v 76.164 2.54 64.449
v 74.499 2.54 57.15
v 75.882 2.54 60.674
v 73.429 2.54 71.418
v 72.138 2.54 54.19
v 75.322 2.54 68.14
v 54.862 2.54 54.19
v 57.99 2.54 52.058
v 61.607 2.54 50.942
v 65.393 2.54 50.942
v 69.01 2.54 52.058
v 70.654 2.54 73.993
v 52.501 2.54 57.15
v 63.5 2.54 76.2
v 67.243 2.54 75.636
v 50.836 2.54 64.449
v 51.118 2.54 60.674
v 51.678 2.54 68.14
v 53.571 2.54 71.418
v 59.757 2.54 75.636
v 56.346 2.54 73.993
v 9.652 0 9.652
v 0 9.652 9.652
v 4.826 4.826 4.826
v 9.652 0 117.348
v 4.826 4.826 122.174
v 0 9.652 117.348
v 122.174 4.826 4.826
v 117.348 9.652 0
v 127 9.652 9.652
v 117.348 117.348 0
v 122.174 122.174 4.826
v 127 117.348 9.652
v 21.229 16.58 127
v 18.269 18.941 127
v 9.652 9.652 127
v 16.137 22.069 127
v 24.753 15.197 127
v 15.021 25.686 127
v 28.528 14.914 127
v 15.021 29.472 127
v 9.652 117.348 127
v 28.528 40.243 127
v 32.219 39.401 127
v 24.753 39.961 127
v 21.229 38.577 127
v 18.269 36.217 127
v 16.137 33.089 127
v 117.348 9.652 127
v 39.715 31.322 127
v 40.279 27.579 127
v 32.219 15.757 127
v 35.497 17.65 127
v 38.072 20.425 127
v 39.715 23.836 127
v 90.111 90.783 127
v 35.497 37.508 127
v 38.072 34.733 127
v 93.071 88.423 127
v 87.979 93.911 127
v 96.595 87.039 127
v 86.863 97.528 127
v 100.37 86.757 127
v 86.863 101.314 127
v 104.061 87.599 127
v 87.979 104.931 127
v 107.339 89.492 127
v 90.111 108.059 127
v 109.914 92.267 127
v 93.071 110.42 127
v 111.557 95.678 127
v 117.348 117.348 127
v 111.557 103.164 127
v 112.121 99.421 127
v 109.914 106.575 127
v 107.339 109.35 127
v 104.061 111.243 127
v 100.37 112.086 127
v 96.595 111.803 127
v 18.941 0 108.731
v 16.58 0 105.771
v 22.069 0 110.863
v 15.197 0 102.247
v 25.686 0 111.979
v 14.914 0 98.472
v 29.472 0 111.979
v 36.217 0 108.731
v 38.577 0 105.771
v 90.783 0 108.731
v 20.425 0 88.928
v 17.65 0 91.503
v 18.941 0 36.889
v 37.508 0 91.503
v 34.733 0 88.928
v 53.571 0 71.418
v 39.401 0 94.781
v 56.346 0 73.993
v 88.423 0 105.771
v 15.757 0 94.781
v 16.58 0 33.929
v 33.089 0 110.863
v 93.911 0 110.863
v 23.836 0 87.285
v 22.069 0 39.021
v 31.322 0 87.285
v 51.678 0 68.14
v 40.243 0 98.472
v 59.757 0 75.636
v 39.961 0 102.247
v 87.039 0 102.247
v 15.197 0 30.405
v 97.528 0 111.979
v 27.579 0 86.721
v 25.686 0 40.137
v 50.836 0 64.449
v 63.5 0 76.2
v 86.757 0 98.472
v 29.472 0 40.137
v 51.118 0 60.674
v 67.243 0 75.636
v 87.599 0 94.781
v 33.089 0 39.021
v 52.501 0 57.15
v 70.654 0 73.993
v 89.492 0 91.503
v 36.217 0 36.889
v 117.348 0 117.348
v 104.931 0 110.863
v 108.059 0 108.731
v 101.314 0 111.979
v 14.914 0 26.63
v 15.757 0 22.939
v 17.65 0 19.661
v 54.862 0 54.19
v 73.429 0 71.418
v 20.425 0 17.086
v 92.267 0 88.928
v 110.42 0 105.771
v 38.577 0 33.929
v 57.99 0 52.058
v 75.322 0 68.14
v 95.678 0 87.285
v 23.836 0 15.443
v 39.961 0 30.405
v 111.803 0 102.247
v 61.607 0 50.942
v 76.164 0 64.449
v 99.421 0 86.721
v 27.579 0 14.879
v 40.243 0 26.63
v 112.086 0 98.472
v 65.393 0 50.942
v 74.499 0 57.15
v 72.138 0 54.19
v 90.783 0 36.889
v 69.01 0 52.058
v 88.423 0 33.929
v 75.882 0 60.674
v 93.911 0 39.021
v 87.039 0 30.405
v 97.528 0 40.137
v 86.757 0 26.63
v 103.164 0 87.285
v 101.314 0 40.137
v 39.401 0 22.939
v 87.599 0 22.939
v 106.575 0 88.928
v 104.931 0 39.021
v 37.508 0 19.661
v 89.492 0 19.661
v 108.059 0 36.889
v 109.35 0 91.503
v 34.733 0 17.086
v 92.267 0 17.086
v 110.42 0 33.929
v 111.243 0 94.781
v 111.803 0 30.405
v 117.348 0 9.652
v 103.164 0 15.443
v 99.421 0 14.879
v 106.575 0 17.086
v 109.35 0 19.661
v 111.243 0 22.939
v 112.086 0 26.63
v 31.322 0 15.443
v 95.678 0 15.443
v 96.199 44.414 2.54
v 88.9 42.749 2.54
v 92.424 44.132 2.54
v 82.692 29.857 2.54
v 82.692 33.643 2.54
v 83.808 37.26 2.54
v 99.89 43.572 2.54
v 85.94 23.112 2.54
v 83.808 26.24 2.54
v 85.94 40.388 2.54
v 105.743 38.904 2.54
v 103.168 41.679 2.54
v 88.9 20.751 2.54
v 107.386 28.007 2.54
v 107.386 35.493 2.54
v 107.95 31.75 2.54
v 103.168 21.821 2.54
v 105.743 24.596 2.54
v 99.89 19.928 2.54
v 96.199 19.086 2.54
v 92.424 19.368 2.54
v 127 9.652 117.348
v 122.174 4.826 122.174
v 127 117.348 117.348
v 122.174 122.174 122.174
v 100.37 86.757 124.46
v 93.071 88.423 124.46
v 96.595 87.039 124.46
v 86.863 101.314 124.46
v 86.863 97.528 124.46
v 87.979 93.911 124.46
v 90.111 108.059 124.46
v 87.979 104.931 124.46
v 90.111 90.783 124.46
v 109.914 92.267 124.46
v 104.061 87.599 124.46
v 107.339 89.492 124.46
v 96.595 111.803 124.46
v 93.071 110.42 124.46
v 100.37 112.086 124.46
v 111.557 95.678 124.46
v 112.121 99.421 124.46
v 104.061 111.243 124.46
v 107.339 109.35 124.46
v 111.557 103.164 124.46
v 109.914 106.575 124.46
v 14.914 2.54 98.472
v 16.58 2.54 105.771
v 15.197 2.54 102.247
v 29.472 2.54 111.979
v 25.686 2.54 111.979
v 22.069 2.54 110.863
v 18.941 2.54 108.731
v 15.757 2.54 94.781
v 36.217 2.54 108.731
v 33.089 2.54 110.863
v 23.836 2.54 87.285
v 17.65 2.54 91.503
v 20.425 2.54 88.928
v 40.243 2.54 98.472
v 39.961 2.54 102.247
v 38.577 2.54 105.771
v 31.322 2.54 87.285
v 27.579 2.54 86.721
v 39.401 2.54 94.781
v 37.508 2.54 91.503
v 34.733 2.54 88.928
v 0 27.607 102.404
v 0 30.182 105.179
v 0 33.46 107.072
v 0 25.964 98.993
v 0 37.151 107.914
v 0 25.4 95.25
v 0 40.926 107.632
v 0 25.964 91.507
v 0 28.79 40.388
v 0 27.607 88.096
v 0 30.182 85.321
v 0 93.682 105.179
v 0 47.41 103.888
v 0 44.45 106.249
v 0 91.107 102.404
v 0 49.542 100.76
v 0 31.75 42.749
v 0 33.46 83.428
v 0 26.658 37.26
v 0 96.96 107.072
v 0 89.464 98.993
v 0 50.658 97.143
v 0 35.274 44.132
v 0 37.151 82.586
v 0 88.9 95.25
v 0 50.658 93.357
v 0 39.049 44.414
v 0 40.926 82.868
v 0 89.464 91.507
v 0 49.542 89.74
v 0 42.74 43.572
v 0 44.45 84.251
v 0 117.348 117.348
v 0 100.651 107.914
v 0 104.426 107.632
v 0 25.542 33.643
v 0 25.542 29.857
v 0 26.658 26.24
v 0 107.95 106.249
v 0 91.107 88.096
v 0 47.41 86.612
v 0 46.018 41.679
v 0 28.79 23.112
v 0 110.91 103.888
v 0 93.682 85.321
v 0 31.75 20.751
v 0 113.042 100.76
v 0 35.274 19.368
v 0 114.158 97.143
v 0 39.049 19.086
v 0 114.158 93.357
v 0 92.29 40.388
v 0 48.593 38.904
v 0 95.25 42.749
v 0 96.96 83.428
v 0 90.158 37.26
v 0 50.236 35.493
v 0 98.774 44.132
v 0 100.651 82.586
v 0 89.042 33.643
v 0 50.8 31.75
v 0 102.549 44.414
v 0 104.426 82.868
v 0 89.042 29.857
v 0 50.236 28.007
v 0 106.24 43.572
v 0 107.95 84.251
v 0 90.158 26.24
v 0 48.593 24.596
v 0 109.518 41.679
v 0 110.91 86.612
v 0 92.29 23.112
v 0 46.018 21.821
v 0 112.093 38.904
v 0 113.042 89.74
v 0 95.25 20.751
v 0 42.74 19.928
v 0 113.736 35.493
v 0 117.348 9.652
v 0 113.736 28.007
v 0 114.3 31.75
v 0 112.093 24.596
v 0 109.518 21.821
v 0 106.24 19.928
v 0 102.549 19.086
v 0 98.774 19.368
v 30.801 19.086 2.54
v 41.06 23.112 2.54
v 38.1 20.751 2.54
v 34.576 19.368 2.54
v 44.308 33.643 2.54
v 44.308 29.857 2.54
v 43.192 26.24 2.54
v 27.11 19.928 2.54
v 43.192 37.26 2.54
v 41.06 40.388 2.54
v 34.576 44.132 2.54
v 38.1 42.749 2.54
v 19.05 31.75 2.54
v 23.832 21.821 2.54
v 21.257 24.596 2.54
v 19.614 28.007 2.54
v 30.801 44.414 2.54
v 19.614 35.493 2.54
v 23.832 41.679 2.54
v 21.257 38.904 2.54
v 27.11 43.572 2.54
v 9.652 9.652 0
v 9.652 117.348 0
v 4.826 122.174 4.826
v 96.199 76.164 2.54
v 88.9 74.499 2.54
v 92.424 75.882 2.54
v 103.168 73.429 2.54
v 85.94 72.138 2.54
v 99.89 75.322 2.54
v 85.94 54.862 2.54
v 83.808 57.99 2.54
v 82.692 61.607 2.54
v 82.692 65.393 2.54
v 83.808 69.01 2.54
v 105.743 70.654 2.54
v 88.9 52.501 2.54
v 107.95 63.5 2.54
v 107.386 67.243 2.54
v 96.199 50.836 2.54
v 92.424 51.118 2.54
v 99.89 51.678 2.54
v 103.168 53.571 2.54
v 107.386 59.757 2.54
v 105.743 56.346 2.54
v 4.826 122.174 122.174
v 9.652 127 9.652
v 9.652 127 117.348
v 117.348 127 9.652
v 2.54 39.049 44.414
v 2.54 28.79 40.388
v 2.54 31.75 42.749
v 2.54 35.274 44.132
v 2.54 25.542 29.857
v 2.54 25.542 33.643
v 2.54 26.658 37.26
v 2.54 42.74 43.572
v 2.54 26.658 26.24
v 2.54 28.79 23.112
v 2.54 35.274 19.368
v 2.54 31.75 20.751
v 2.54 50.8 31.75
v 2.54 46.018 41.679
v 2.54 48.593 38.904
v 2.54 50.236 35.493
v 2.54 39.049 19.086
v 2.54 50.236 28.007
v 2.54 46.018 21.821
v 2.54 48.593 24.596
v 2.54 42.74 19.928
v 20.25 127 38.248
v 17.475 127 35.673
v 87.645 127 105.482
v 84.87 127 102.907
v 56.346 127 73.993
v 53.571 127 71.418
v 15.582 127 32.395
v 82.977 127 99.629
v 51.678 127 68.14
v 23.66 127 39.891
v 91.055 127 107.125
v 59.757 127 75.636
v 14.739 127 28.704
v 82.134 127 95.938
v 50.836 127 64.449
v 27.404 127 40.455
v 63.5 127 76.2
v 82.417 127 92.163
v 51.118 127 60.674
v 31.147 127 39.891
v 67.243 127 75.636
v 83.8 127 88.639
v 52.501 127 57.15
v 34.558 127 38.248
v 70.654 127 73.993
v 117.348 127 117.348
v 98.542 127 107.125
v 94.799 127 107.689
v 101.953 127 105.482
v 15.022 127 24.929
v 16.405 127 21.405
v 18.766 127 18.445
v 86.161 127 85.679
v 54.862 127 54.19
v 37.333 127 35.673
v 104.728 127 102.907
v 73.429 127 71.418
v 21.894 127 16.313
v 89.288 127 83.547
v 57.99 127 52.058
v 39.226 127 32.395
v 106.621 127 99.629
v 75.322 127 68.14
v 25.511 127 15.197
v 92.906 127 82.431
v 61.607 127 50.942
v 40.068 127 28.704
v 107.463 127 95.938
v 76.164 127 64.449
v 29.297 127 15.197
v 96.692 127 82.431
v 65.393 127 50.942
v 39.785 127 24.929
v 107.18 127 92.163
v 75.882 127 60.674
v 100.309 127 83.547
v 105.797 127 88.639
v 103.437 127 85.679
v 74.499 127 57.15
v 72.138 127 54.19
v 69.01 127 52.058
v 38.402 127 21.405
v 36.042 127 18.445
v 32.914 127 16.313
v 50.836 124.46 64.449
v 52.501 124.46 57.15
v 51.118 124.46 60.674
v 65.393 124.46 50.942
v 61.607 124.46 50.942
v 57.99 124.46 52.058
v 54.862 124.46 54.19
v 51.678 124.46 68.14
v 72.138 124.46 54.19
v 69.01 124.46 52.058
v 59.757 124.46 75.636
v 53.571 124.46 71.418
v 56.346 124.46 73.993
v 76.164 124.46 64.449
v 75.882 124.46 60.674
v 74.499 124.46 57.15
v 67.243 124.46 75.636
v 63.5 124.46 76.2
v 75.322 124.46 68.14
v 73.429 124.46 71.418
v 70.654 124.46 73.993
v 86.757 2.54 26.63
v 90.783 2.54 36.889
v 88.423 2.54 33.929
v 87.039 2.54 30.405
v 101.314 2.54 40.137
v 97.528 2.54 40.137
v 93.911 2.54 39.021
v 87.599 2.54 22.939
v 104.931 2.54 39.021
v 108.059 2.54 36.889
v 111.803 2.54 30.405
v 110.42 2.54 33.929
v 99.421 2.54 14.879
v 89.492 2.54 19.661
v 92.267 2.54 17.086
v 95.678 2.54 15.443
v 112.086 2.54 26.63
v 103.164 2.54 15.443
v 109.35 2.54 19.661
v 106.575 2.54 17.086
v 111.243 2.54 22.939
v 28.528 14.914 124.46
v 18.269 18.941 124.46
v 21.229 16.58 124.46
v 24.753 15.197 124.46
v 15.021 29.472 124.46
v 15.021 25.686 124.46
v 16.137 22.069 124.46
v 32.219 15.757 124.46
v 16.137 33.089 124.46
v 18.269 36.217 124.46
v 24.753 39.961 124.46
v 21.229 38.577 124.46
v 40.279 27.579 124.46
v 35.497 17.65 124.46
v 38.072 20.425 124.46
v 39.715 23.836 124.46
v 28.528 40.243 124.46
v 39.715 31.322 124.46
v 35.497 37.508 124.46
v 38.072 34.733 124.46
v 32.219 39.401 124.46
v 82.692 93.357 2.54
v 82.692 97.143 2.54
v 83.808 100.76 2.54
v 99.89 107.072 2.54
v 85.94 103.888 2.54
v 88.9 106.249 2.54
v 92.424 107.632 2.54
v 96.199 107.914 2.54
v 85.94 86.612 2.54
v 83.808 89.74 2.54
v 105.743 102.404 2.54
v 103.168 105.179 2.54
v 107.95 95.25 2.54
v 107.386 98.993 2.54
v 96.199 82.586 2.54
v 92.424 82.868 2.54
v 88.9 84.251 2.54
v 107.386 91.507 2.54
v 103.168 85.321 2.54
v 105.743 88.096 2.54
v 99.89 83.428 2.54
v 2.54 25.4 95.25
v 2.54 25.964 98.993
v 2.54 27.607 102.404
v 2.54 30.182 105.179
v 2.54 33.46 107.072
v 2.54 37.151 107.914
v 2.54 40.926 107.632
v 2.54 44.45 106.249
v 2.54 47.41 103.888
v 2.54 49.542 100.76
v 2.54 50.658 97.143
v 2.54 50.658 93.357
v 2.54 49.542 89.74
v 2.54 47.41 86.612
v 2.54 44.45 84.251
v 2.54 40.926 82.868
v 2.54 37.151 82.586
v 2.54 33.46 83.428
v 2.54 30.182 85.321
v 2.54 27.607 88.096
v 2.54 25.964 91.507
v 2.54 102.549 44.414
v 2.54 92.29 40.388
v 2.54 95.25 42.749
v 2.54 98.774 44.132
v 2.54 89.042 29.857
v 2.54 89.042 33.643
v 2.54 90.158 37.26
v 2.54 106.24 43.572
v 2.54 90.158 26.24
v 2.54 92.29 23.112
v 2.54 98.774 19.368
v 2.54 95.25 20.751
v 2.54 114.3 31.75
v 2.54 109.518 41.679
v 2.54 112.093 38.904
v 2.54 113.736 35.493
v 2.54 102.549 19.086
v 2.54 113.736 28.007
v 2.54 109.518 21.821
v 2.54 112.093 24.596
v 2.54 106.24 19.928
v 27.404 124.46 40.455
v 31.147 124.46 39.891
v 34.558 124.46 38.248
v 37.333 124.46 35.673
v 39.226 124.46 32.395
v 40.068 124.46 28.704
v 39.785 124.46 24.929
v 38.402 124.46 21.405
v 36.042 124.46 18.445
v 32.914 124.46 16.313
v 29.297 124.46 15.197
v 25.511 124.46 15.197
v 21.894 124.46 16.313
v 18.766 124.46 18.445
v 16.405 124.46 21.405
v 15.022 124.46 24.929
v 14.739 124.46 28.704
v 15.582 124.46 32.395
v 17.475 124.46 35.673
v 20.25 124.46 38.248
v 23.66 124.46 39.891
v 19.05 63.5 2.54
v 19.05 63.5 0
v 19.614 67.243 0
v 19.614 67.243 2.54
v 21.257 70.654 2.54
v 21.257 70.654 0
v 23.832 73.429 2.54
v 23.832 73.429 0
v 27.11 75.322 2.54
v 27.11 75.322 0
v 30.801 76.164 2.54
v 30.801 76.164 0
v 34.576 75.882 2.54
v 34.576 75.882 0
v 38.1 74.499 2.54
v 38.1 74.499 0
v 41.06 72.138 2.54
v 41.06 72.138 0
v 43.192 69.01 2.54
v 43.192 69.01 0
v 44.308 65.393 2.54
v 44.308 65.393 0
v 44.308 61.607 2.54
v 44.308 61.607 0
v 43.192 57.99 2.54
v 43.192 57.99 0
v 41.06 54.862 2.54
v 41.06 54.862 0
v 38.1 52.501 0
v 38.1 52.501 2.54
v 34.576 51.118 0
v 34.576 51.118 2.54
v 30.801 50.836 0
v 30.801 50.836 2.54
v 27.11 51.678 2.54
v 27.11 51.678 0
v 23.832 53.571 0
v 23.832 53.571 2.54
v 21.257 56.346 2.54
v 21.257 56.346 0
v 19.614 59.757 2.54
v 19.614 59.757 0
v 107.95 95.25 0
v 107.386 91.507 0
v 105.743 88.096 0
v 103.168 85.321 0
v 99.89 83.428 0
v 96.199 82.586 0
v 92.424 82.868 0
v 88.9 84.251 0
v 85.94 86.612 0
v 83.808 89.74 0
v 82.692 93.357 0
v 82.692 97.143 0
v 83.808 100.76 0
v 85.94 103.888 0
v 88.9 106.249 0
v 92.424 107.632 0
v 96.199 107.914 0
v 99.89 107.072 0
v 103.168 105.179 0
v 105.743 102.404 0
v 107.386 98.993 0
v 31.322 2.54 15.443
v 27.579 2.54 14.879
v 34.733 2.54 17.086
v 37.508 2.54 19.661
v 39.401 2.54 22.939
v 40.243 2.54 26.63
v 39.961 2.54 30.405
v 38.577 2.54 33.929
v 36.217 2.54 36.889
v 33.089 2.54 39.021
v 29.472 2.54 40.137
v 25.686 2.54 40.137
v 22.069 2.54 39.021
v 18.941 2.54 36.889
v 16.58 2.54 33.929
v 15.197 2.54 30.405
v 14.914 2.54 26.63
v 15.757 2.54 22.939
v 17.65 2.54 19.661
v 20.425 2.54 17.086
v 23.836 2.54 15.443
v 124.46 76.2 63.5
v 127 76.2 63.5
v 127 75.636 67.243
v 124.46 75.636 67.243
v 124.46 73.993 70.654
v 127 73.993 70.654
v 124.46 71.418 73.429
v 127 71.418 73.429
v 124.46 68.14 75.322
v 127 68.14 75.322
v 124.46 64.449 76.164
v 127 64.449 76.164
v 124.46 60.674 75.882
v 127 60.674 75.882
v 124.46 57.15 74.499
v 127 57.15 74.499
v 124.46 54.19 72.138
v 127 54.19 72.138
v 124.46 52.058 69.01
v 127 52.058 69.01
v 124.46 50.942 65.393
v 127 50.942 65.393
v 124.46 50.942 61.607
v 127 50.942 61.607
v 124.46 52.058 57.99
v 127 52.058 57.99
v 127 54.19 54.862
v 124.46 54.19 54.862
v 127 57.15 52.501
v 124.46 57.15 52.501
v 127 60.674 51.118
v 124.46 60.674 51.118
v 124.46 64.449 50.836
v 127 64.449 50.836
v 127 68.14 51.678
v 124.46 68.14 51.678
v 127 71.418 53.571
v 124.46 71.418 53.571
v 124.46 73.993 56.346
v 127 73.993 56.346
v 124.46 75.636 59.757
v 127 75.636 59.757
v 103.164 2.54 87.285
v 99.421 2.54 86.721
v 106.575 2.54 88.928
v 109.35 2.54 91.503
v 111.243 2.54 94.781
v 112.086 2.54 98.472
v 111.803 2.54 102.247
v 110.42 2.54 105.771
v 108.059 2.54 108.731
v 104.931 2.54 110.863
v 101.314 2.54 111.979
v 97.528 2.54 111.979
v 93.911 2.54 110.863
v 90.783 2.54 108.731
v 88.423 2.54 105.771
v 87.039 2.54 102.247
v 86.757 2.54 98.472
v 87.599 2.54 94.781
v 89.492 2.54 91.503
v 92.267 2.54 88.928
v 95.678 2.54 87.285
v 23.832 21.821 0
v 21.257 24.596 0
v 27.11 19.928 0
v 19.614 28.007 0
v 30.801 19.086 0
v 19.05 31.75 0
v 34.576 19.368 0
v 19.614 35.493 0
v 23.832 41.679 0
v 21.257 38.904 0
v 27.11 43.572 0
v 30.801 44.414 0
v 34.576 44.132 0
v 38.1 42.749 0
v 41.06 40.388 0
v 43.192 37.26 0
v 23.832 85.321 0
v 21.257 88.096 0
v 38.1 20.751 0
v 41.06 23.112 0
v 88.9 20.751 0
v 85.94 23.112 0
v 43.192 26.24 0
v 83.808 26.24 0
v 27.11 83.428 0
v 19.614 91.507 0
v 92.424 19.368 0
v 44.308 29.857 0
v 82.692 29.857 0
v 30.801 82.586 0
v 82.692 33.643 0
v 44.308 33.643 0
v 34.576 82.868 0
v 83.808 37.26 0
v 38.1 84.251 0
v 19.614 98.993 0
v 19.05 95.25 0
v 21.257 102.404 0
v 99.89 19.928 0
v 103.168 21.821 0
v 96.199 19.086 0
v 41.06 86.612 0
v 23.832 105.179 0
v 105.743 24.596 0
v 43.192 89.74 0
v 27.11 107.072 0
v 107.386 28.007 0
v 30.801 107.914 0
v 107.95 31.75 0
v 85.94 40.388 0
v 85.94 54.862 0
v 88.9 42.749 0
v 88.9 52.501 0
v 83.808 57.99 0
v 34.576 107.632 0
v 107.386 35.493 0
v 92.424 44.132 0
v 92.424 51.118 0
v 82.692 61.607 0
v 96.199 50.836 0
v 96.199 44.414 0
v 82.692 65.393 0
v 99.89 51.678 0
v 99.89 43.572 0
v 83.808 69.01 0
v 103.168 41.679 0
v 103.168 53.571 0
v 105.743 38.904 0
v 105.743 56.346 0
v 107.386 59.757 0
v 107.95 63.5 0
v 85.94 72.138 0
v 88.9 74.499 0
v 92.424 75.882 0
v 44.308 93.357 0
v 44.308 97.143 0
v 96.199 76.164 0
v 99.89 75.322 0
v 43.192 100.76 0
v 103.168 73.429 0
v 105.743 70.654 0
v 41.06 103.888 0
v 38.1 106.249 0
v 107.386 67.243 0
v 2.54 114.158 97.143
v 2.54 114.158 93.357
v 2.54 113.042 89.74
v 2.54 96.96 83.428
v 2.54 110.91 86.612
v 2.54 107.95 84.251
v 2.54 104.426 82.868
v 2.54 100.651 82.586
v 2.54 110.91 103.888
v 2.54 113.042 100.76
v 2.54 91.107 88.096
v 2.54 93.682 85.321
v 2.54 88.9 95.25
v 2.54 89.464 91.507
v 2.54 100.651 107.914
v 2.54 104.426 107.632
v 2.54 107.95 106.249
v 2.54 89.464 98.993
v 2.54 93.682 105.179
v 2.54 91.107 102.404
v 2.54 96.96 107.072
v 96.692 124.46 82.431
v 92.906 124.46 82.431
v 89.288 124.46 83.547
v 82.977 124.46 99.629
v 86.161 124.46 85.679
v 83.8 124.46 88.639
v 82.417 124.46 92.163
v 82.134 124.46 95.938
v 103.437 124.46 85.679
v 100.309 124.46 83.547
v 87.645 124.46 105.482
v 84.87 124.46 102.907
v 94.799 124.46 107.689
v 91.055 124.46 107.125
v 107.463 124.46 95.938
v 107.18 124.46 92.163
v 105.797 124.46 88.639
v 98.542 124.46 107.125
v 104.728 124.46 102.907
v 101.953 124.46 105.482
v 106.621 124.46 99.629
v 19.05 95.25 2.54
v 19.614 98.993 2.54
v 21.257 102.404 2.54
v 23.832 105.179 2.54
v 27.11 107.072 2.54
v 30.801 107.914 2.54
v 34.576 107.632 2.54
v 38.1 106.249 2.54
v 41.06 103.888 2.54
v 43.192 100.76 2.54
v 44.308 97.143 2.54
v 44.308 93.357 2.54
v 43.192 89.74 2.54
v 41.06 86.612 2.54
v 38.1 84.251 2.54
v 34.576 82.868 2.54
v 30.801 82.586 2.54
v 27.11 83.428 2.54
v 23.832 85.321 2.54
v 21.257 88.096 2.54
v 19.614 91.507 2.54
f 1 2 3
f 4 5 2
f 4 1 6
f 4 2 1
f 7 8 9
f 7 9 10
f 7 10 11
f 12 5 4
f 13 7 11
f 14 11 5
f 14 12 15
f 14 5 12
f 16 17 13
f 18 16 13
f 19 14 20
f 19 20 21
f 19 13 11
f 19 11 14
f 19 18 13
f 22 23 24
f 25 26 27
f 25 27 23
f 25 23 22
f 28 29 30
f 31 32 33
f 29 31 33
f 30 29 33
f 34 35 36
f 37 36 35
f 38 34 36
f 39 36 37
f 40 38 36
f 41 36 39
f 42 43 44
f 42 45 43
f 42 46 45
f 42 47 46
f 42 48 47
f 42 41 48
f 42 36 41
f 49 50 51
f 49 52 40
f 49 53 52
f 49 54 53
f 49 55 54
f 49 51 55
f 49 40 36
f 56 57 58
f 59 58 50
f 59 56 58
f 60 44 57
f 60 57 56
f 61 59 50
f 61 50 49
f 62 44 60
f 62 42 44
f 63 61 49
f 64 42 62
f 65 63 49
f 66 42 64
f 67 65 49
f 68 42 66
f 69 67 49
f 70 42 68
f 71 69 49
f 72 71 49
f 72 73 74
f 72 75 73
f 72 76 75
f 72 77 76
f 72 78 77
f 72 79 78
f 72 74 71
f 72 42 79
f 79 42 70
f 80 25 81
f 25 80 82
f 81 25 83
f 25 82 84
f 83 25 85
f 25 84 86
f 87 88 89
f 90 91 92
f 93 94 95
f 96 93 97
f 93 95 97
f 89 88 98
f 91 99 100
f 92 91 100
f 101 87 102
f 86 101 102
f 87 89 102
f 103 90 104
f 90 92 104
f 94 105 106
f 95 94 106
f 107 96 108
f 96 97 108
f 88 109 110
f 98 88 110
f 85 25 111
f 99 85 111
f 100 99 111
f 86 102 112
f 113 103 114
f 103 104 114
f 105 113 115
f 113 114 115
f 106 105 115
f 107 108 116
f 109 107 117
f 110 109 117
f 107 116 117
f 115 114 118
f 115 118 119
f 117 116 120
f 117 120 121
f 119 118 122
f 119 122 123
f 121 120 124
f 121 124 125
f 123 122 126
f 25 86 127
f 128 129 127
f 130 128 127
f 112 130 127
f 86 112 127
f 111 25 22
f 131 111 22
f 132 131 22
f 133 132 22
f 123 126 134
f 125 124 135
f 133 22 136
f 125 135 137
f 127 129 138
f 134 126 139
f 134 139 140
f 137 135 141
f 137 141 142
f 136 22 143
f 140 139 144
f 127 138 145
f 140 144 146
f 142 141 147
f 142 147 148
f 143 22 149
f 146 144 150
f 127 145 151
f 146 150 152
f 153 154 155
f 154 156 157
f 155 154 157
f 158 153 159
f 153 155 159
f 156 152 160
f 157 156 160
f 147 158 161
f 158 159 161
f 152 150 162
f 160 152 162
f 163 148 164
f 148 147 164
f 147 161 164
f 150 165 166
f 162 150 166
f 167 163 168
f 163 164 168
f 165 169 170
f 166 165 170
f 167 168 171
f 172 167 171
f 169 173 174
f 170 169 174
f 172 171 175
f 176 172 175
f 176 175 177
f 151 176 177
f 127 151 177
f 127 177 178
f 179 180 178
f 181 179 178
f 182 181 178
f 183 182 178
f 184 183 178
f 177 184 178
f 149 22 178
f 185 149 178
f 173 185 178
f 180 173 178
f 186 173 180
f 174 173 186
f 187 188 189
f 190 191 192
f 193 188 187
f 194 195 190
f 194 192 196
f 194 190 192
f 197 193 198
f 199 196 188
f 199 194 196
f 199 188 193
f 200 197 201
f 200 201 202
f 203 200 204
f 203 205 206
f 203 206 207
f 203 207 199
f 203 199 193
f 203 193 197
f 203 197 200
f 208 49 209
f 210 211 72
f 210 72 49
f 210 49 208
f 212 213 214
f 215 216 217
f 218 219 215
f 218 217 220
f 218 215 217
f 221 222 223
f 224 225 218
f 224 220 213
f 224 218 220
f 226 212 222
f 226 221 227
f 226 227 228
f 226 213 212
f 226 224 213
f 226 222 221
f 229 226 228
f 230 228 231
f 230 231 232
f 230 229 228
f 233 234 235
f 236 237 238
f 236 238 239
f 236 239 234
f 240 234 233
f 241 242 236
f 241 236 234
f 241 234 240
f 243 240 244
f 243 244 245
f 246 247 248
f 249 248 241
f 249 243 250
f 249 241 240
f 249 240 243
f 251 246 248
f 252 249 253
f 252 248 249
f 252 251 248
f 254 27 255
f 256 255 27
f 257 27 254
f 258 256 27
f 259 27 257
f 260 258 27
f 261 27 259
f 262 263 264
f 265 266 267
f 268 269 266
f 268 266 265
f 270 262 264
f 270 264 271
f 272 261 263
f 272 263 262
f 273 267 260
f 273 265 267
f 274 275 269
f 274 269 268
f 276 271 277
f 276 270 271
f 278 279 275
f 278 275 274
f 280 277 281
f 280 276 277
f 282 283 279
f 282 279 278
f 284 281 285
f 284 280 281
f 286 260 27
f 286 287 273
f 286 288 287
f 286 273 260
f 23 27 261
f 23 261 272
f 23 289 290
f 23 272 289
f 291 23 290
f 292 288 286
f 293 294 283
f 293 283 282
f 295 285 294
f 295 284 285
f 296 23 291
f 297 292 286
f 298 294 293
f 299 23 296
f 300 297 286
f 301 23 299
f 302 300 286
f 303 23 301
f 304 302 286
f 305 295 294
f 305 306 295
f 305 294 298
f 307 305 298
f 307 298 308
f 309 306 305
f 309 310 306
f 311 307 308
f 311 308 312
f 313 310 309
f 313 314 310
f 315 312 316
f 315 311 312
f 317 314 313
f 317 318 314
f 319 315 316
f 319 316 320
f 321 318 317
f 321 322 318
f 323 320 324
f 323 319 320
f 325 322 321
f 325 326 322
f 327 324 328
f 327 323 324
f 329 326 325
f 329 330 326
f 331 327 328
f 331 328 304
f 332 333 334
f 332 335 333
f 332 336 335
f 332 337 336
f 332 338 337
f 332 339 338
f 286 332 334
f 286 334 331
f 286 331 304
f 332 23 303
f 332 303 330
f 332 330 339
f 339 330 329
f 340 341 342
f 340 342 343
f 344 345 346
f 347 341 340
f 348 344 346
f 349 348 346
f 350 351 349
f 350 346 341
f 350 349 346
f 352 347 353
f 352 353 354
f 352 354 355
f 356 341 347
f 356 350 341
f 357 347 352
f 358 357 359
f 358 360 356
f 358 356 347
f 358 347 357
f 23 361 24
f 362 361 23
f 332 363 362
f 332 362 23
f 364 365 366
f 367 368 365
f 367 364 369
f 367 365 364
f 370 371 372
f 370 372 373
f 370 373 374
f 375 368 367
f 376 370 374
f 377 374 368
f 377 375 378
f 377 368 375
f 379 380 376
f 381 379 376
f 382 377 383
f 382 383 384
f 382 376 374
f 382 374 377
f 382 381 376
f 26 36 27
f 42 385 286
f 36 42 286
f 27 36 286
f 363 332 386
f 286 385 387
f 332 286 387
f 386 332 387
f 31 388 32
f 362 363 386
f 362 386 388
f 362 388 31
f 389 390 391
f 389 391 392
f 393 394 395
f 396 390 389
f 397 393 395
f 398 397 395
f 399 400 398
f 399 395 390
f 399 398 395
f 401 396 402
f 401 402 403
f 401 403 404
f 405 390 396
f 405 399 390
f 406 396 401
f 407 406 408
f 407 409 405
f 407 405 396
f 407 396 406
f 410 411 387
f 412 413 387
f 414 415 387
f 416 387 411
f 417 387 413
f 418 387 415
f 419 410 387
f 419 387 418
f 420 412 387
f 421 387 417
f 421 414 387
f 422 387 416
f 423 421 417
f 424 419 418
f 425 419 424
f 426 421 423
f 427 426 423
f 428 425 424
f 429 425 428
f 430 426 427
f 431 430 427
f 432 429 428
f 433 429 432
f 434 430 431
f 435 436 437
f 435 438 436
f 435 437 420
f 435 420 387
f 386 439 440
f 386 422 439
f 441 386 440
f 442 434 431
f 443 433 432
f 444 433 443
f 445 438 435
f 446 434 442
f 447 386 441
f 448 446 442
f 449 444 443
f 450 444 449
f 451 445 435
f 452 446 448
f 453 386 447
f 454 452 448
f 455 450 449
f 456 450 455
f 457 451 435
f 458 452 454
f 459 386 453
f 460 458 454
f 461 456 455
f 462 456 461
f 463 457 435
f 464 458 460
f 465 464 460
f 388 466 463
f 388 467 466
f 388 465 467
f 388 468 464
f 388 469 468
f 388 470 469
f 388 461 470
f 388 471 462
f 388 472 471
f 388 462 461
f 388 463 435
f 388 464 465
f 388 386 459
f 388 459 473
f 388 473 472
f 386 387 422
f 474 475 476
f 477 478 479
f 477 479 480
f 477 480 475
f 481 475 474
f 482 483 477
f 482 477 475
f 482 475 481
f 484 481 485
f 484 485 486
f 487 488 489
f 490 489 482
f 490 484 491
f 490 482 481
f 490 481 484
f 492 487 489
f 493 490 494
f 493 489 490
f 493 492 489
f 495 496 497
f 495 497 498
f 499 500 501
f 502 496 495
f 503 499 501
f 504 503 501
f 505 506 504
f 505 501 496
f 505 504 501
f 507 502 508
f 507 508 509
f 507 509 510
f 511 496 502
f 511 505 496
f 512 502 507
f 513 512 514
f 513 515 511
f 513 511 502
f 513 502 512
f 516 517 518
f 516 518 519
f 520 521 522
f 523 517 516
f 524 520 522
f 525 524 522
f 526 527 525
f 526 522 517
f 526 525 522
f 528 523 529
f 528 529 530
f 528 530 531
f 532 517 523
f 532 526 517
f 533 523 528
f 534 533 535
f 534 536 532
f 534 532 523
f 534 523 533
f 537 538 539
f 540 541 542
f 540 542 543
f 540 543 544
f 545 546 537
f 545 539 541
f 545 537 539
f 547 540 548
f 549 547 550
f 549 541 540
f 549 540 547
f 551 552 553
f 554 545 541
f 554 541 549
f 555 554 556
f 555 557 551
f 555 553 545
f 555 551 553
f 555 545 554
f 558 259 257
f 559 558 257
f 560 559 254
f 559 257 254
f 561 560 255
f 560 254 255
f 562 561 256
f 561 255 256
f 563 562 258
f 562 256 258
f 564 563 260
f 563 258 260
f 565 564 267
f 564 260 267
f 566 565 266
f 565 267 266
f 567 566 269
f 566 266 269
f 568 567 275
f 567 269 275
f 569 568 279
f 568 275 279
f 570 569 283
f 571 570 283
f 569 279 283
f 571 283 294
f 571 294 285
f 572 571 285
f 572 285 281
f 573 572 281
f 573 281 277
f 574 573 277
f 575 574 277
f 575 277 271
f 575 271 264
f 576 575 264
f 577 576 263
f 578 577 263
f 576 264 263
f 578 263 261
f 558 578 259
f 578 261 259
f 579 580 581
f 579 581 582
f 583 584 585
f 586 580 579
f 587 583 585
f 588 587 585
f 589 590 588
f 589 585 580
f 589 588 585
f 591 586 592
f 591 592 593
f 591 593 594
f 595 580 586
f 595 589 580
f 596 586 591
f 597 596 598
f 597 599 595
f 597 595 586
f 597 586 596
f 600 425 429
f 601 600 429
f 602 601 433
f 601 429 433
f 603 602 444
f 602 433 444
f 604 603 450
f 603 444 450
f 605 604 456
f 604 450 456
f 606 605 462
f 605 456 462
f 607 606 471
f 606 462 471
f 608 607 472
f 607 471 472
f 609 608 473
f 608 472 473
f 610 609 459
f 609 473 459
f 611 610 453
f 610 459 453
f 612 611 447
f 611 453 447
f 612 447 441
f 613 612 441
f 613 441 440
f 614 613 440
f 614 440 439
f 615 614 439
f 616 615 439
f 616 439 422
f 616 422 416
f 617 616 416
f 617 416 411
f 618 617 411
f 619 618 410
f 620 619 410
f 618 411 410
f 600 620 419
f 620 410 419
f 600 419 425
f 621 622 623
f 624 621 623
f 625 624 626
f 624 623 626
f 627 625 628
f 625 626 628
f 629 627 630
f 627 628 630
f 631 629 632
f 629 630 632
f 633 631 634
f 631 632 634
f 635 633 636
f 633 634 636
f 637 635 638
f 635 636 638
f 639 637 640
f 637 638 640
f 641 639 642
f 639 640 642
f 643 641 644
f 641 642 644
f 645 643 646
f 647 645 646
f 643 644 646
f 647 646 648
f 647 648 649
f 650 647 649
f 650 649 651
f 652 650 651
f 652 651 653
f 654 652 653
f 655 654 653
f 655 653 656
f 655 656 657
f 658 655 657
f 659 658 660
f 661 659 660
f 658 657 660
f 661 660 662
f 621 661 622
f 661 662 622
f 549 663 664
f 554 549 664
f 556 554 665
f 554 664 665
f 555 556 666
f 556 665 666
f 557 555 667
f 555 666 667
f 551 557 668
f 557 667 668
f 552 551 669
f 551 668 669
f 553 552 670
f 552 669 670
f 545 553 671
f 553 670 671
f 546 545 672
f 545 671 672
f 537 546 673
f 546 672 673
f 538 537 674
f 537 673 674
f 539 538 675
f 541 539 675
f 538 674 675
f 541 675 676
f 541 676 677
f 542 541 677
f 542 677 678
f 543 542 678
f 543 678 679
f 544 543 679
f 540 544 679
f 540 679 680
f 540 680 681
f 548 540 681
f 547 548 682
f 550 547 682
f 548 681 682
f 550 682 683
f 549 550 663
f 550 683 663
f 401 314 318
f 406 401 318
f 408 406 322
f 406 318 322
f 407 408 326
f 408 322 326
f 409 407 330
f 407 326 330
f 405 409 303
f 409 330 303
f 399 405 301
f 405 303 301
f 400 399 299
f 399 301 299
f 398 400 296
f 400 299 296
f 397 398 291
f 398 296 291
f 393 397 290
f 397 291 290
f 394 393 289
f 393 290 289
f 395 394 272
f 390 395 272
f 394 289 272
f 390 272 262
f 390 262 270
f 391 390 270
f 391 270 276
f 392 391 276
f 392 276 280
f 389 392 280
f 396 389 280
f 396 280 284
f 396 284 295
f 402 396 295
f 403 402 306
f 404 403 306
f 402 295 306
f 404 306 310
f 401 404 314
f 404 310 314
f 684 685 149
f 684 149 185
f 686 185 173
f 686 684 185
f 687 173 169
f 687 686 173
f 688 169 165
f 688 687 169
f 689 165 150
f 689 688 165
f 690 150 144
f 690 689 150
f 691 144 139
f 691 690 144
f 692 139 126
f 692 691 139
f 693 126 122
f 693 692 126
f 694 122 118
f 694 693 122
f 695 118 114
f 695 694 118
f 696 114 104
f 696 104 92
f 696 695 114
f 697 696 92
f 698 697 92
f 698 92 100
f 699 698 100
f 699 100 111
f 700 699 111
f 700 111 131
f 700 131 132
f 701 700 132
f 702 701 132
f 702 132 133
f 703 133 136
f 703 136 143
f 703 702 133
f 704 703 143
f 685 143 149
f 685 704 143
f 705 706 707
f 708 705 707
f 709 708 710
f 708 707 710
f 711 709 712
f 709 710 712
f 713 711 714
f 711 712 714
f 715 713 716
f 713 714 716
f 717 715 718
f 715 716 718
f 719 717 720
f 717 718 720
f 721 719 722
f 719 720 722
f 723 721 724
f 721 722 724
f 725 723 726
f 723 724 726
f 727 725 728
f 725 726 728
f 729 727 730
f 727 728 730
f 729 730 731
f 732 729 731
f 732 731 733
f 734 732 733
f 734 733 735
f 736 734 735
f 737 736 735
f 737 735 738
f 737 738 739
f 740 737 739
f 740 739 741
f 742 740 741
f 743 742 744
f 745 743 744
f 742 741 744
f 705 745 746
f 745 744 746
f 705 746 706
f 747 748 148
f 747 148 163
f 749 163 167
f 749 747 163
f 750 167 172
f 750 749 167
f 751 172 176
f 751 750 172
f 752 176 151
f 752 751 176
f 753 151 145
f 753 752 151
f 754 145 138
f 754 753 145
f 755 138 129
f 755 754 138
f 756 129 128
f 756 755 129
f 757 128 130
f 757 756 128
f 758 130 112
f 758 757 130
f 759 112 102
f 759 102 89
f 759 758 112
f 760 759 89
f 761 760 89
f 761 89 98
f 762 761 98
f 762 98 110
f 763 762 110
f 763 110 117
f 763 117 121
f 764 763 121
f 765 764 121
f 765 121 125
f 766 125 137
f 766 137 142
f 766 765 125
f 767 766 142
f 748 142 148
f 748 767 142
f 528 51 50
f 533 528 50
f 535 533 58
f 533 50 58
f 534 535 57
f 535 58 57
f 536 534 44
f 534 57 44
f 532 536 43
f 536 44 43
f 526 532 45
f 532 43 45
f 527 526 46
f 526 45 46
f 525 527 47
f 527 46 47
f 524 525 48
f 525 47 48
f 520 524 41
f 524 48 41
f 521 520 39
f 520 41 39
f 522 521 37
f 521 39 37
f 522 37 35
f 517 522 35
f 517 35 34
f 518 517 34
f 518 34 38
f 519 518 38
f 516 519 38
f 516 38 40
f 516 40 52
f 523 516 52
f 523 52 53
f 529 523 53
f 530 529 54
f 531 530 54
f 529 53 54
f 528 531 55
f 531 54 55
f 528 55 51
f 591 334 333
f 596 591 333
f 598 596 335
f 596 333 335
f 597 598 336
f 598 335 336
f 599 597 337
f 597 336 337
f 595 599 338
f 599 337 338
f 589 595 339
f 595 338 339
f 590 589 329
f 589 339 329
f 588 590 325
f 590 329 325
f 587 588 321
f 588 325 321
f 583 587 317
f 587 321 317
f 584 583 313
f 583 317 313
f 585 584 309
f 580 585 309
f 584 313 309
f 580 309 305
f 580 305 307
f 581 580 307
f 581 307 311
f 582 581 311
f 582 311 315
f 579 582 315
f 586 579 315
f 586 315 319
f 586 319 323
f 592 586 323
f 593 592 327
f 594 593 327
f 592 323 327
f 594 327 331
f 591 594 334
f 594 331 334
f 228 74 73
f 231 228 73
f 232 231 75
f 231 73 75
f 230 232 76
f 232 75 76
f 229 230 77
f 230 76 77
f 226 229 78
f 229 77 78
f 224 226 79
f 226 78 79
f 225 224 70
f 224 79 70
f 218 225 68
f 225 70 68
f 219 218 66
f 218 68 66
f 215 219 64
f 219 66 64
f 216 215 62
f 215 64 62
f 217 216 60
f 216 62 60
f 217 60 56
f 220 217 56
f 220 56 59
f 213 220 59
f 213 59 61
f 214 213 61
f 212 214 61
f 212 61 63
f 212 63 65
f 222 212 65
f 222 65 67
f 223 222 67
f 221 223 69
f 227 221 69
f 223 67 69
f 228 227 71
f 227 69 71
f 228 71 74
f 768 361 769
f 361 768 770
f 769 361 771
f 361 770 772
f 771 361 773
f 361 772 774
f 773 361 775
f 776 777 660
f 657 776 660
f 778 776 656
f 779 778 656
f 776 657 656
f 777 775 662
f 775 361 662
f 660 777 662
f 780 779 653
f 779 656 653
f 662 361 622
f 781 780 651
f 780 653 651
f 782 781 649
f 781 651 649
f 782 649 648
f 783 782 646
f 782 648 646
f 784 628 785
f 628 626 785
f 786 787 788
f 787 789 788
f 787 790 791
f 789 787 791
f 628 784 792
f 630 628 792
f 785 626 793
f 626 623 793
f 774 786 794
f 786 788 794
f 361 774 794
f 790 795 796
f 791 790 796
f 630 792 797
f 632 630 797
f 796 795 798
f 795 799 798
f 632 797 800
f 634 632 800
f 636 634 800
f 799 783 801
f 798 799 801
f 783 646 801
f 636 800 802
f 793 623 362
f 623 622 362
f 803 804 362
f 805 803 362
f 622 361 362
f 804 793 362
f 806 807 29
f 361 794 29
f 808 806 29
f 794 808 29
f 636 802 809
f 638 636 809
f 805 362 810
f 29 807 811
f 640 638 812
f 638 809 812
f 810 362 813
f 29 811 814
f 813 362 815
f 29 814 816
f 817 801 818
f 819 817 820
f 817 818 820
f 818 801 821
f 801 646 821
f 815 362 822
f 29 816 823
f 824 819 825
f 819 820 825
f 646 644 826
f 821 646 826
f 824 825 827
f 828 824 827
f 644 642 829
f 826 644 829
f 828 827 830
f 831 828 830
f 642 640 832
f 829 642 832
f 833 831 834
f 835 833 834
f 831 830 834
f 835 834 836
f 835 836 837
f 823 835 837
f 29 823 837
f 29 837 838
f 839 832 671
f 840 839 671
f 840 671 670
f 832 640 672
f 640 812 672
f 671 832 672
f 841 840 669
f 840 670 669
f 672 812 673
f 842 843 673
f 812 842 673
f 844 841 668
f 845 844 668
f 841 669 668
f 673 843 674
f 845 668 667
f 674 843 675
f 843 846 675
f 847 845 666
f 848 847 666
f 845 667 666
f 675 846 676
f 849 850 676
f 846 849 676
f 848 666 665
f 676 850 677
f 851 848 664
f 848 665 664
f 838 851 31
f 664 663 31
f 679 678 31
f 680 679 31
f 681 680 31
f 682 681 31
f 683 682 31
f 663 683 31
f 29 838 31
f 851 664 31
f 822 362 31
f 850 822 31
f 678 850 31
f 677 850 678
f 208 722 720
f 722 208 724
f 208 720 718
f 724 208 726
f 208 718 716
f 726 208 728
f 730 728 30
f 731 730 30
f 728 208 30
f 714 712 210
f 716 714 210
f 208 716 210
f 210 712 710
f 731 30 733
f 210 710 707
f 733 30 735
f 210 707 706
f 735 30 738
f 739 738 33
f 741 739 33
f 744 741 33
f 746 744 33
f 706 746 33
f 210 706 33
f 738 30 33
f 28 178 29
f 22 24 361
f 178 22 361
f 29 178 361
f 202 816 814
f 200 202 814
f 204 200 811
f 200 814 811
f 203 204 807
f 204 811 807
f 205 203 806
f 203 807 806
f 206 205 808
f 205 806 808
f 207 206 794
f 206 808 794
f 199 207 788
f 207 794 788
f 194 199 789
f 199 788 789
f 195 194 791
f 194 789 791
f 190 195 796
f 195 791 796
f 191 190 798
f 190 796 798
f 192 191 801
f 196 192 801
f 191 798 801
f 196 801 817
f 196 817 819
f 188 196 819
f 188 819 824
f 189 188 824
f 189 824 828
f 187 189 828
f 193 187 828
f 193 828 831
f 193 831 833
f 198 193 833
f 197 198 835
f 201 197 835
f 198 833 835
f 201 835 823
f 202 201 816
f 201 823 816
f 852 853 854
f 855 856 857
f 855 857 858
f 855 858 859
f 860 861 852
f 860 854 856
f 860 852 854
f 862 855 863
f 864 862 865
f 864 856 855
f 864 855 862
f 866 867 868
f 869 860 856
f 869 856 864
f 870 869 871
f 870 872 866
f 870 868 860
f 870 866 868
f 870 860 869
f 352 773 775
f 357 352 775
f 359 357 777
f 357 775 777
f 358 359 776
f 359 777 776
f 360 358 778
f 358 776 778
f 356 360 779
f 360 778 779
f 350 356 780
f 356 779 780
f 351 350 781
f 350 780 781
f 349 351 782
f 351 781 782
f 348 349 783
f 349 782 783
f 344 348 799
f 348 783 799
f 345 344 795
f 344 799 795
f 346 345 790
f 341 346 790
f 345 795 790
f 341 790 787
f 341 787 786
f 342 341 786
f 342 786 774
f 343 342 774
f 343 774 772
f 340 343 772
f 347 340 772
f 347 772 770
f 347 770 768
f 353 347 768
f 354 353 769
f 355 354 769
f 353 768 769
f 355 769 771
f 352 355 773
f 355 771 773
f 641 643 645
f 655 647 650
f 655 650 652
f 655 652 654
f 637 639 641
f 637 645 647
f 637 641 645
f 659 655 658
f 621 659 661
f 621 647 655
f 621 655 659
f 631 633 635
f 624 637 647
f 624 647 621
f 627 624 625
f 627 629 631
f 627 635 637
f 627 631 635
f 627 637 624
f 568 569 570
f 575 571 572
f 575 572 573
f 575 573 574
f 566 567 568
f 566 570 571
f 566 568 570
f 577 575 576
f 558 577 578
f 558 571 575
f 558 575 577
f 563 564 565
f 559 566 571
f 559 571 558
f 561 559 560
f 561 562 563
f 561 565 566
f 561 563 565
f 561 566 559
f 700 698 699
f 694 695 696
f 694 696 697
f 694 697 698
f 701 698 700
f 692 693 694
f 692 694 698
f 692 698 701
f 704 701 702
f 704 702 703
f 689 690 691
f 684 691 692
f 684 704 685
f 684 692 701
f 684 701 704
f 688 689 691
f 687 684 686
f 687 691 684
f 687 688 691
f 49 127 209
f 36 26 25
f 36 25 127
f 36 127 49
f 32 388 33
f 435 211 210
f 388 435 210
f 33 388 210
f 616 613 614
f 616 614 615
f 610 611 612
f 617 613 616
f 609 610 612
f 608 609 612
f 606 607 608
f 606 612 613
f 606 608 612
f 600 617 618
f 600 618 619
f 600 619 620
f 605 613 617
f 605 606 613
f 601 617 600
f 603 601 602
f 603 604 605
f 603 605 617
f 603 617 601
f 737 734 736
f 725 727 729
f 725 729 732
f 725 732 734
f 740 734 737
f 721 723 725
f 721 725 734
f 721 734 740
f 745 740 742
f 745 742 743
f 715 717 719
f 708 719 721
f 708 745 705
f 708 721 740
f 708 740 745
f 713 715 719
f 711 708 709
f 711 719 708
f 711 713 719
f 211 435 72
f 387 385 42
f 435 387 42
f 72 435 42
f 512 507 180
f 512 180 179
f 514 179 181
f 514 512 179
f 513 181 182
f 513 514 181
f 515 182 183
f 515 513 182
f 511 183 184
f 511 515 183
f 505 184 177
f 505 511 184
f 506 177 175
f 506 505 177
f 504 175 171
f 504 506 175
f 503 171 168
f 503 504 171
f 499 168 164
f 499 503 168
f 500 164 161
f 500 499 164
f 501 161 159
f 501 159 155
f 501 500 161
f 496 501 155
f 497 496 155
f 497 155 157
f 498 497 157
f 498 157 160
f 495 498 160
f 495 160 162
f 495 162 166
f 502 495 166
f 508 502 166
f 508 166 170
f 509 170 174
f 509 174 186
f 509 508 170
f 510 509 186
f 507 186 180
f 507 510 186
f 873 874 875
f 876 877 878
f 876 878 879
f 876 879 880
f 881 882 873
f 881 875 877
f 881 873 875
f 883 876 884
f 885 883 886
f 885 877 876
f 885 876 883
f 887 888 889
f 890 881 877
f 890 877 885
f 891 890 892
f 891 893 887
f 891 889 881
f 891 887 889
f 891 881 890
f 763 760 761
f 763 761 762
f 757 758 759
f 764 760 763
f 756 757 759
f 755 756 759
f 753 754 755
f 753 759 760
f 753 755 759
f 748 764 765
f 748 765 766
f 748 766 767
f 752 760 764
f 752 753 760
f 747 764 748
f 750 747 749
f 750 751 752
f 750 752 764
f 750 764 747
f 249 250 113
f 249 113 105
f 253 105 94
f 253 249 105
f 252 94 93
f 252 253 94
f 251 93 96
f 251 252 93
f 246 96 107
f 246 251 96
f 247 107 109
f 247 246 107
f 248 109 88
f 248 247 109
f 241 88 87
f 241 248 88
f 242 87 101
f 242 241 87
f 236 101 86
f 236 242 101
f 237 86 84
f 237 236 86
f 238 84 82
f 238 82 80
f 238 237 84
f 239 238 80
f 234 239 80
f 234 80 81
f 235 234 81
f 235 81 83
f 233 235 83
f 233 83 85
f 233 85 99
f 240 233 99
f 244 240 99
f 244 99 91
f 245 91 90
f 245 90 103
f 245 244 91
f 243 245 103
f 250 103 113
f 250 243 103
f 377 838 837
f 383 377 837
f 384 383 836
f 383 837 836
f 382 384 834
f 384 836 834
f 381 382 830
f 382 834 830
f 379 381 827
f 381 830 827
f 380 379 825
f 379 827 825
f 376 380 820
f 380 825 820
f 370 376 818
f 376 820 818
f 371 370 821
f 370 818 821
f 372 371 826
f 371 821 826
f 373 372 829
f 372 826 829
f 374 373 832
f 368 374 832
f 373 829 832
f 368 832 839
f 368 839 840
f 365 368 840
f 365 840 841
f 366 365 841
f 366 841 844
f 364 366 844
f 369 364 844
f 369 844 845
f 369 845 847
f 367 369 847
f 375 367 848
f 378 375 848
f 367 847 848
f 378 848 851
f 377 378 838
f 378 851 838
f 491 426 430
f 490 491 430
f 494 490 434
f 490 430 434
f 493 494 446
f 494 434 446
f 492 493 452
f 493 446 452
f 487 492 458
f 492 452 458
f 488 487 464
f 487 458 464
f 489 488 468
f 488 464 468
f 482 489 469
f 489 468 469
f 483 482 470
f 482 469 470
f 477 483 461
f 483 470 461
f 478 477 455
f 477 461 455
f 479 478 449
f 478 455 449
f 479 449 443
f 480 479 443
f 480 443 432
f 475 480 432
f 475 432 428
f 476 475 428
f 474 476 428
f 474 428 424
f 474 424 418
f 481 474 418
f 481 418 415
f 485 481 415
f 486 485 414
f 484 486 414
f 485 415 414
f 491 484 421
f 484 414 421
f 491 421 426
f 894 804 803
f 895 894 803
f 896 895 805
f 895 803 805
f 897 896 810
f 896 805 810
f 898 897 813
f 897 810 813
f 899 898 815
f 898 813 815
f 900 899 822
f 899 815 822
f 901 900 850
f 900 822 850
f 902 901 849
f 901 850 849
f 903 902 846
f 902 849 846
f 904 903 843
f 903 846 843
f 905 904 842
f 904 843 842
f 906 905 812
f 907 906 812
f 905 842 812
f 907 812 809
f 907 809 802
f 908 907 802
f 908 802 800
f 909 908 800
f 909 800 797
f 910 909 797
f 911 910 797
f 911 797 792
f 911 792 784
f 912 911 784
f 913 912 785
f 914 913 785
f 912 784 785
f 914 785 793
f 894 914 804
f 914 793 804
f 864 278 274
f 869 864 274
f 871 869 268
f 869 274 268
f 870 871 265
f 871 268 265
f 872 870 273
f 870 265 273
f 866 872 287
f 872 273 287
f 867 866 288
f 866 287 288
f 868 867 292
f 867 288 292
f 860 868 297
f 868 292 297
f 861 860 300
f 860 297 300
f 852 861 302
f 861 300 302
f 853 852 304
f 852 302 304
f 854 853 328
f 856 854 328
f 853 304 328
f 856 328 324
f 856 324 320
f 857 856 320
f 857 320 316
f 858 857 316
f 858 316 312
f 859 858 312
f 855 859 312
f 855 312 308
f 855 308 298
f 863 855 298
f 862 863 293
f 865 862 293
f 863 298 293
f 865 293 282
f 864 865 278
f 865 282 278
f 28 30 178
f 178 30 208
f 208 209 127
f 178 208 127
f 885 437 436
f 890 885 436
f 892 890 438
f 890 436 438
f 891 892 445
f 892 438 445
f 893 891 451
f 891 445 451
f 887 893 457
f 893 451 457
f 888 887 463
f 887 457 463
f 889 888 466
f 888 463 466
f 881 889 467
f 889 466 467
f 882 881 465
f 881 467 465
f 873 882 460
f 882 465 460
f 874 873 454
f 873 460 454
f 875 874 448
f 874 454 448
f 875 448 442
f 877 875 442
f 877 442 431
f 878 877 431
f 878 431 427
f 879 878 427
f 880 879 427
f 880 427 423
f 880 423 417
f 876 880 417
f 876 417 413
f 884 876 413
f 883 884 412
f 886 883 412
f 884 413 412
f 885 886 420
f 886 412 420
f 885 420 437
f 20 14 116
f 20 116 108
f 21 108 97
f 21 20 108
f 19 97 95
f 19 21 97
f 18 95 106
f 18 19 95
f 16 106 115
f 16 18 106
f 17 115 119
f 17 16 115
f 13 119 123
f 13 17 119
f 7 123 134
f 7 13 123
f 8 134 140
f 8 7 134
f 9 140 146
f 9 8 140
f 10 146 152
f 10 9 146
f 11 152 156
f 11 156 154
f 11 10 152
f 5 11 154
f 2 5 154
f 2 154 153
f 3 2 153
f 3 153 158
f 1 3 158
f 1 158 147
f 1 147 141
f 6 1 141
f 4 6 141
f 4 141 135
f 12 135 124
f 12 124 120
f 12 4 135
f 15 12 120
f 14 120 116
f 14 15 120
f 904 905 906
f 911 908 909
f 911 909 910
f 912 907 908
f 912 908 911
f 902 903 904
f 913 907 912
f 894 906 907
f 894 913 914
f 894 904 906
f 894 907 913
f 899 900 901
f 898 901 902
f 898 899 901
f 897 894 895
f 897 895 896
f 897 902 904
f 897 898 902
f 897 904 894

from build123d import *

# Parameters (mm, degrees)
SKETCH1_W           = 127
SKETCH1_H           = 127
CUBE_DEPTH          = 127
SKETCH1_2_W         = 127
SKETCH1_2_H         = 127
BOSS_EXTRUDE2_DEPTH = 127
SKETCH4_R           = 12.7
F_6_DOT_CUT_DEPTH   = 2.54
SKETCH9_R           = 12.7
F_4_DOT_CUT_DEPTH   = 2.54
SKETCH10_R          = 12.7
F_3_DOT_CUT_DEPTH   = 2.54
F_5_DOT_START       = -2.54
SKETCH11_R          = 12.7
F_5_DOT_CUT_DEPTH   = 2.54
SKETCH12_R          = 12.7
F_1_DOT_CUT_DEPTH   = 2.54
SKETCH13_R          = 12.7
F_2_DOT_CUT_DEPTH   = 2.54
CUT_EXTRUDE7_REACH  = 221.97
CUT_EXTRUDE8_REACH  = 221.97
CUT_EXTRUDE9_REACH  = 221.97


with BuildPart() as part:
    # Sketch1 → Cube (new body)
    with BuildSketch(Plane.XY):
        with Locations((63.5, 63.5)):
            Rectangle(SKETCH1_W, SKETCH1_H)
    extrude(amount=CUBE_DEPTH)

    # Sketch1<2> → Boss-Extrude2 (add)
    with BuildSketch(Plane.XY):
        with Locations((63.5, 63.5)):
            Rectangle(SKETCH1_2_W, SKETCH1_2_H)
    extrude(amount=BOSS_EXTRUDE2_DEPTH)

    # Sketch4 → 6-dot cut (cut)
    with BuildSketch(Plane(origin=(0, 0, 0), x_dir=(-1, 0, 0), z_dir=(0, 0, -1))):
        with Locations((-31.75, 63.5)):
            Circle(SKETCH4_R)
        with Locations((-31.75, 31.75)):
            Circle(SKETCH4_R)
        with Locations((-31.75, 95.25)):
            Circle(SKETCH4_R)
        with Locations((-95.25, 31.75)):
            Circle(SKETCH4_R)
        with Locations((-95.25, 63.5)):
            Circle(SKETCH4_R)
        with Locations((-95.25, 95.25)):
            Circle(SKETCH4_R)
    extrude(amount=-F_6_DOT_CUT_DEPTH, mode=Mode.SUBTRACT)

    # Sketch9 → 4-dot cut (cut)
    with BuildSketch(Plane.ZY):
        with Locations((95.25, 101.6)):
            Circle(SKETCH9_R)
        with Locations((95.25, 38.1)):
            Circle(SKETCH9_R)
        with Locations((31.75, 38.1)):
            Circle(SKETCH9_R)
        with Locations((31.75, 101.6)):
            Circle(SKETCH9_R)
    extrude(amount=-F_4_DOT_CUT_DEPTH, mode=Mode.SUBTRACT)

    # Sketch10 → 3-dot cut (cut)
    with BuildSketch(Plane(origin=(0, 127, 0), x_dir=(1, 0, 0), z_dir=(0, 1, 0))):
        with Locations((63.5, -63.5)):
            Circle(SKETCH10_R)
        with Locations((27.403839575, -27.75496954)):
            Circle(SKETCH10_R)
        with Locations((94.798796898, -94.988870563)):
            Circle(SKETCH10_R)
    extrude(amount=-F_3_DOT_CUT_DEPTH, mode=Mode.SUBTRACT)

    # Sketch11 → 5-dot cut (cut)
    with BuildSketch(Plane.XZ.offset(F_5_DOT_START)):
        with Locations((63.5, 63.5)):
            Circle(SKETCH11_R)
        with Locations((27.578975516, 27.578975516)):
            Circle(SKETCH11_R)
        with Locations((99.421024484, 99.421024484)):
            Circle(SKETCH11_R)
        with Locations((27.578975516, 99.421024484)):
            Circle(SKETCH11_R)
        with Locations((99.421024484, 27.578975516)):
            Circle(SKETCH11_R)
    extrude(amount=F_5_DOT_CUT_DEPTH, mode=Mode.SUBTRACT)

    # Sketch12 → 1-dot cut (cut)
    with BuildSketch(Plane(origin=(127, 0, 0), x_dir=(0, 0, -1), z_dir=(1, 0, 0))):
        with Locations((-63.5, 63.5)):
            Circle(SKETCH12_R)
    extrude(amount=-F_1_DOT_CUT_DEPTH, mode=Mode.SUBTRACT)

    # Sketch13 → 2-dot cut (cut)
    with BuildSketch(Plane.XY.offset(127)):
        with Locations((27.578975516, 27.578975516)):
            Circle(SKETCH13_R)
        with Locations((99.421024484, 99.421024484)):
            Circle(SKETCH13_R)
    extrude(amount=-F_2_DOT_CUT_DEPTH, mode=Mode.SUBTRACT)

    # Sketch16 → Cut-Extrude7 (cut, up to next)
    with BuildSketch(Plane.ZY, mode=Mode.PRIVATE) as cut_extrude7_sk1:
        Polygon((0, 127), (9.652, 127), (0, 117.348), align=None)
    cut_extrude7_tool1 = extrude(cut_extrude7_sk1.sketch, amount=-CUT_EXTRUDE7_REACH, mode=Mode.PRIVATE) & part.part
    # Sketch16 → Cut-Extrude7 (cut, up to next)
    with BuildSketch(Plane.ZY, mode=Mode.PRIVATE) as cut_extrude7_sk2:
        Polygon((117.348, 127), (127, 117.348), (127, 127), align=None)
    cut_extrude7_tool2 = extrude(cut_extrude7_sk2.sketch, amount=-CUT_EXTRUDE7_REACH, mode=Mode.PRIVATE) & part.part
    # Sketch16 → Cut-Extrude7 (cut, up to next)
    with BuildSketch(Plane.ZY, mode=Mode.PRIVATE) as cut_extrude7_sk3:
        Polygon((127, 0), (117.348, 0), (127, 9.652), align=None)
    cut_extrude7_tool3 = extrude(cut_extrude7_sk3.sketch, amount=-CUT_EXTRUDE7_REACH, mode=Mode.PRIVATE) & part.part
    # Sketch16 → Cut-Extrude7 (cut, up to next)
    with BuildSketch(Plane.ZY, mode=Mode.PRIVATE) as cut_extrude7_sk4:
        Polygon((9.652, 0), (0, 9.652), (0, 0), align=None)
    cut_extrude7_tool4 = extrude(cut_extrude7_sk4.sketch, amount=-CUT_EXTRUDE7_REACH, mode=Mode.PRIVATE) & part.part
    add(cut_extrude7_tool1.solids().sort_by_distance((0, 123.782667, 3.217333))[0], mode=Mode.SUBTRACT)
    add(cut_extrude7_tool2.solids().sort_by_distance((0, 123.782667, 123.782667))[0], mode=Mode.SUBTRACT)
    add(cut_extrude7_tool3.solids().sort_by_distance((0, 3.217333, 123.782667))[0], mode=Mode.SUBTRACT)
    add(cut_extrude7_tool4.solids().sort_by_distance((0, 3.217333, 3.217333))[0], mode=Mode.SUBTRACT)

    # Sketch17 → Cut-Extrude8 (cut, up to next)
    with BuildSketch(Plane.XY.offset(127), mode=Mode.PRIVATE) as cut_extrude8_sk1:
        Polygon((9.652, 127), (0, 127), (0, 117.348), align=None)
    cut_extrude8_tool1 = extrude(cut_extrude8_sk1.sketch, amount=-CUT_EXTRUDE8_REACH, mode=Mode.PRIVATE) & part.part
    # Sketch17 → Cut-Extrude8 (cut, up to next)
    with BuildSketch(Plane.XY.offset(127), mode=Mode.PRIVATE) as cut_extrude8_sk2:
        Polygon((117.348, 127), (127, 117.348), (127, 127), align=None)
    cut_extrude8_tool2 = extrude(cut_extrude8_sk2.sketch, amount=-CUT_EXTRUDE8_REACH, mode=Mode.PRIVATE) & part.part
    # Sketch17 → Cut-Extrude8 (cut, up to next)
    with BuildSketch(Plane.XY.offset(127), mode=Mode.PRIVATE) as cut_extrude8_sk3:
        Polygon((117.348, 0), (127, 0), (127, 9.652), align=None)
    cut_extrude8_tool3 = extrude(cut_extrude8_sk3.sketch, amount=-CUT_EXTRUDE8_REACH, mode=Mode.PRIVATE) & part.part
    # Sketch17 → Cut-Extrude8 (cut, up to next)
    with BuildSketch(Plane.XY.offset(127), mode=Mode.PRIVATE) as cut_extrude8_sk4:
        Polygon((9.652, 0), (0, 0), (0, 9.652), align=None)
    cut_extrude8_tool4 = extrude(cut_extrude8_sk4.sketch, amount=-CUT_EXTRUDE8_REACH, mode=Mode.PRIVATE) & part.part
    add(cut_extrude8_tool1.solids().sort_by_distance((3.217333, 123.782667, 127))[0], mode=Mode.SUBTRACT)
    add(cut_extrude8_tool2.solids().sort_by_distance((123.782667, 123.782667, 127))[0], mode=Mode.SUBTRACT)
    add(cut_extrude8_tool3.solids().sort_by_distance((123.782667, 3.217333, 127))[0], mode=Mode.SUBTRACT)
    add(cut_extrude8_tool4.solids().sort_by_distance((3.217333, 3.217333, 127))[0], mode=Mode.SUBTRACT)

    # Sketch18 → Cut-Extrude9 (cut, up to next)
    with BuildSketch(Plane(origin=(0, 127, 0), x_dir=(1, 0, 0), z_dir=(0, 1, 0)), mode=Mode.PRIVATE) as cut_extrude9_sk1:
        Polygon((0, 0), (9.652, 0), (0, -9.652), align=None)
    cut_extrude9_tool1 = extrude(cut_extrude9_sk1.sketch, amount=-CUT_EXTRUDE9_REACH, mode=Mode.PRIVATE) & part.part
    # Sketch18 → Cut-Extrude9 (cut, up to next)
    with BuildSketch(Plane(origin=(0, 127, 0), x_dir=(1, 0, 0), z_dir=(0, 1, 0)), mode=Mode.PRIVATE) as cut_extrude9_sk2:
        Polygon((117.348, 0), (127, -9.652), (127, 0), align=None)
    cut_extrude9_tool2 = extrude(cut_extrude9_sk2.sketch, amount=-CUT_EXTRUDE9_REACH, mode=Mode.PRIVATE) & part.part
    # Sketch18 → Cut-Extrude9 (cut, up to next)
    with BuildSketch(Plane(origin=(0, 127, 0), x_dir=(1, 0, 0), z_dir=(0, 1, 0)), mode=Mode.PRIVATE) as cut_extrude9_sk3:
        Polygon((127, -127), (117.348, -127), (127, -117.348), align=None)
    cut_extrude9_tool3 = extrude(cut_extrude9_sk3.sketch, amount=-CUT_EXTRUDE9_REACH, mode=Mode.PRIVATE) & part.part
    # Sketch18 → Cut-Extrude9 (cut, up to next)
    with BuildSketch(Plane(origin=(0, 127, 0), x_dir=(1, 0, 0), z_dir=(0, 1, 0)), mode=Mode.PRIVATE) as cut_extrude9_sk4:
        Polygon((9.652, -127), (0, -117.348), (0, -127), align=None)
    cut_extrude9_tool4 = extrude(cut_extrude9_sk4.sketch, amount=-CUT_EXTRUDE9_REACH, mode=Mode.PRIVATE) & part.part
    add(cut_extrude9_tool1.solids().sort_by_distance((3.217333, 127, 3.217333))[0], mode=Mode.SUBTRACT)
    add(cut_extrude9_tool2.solids().sort_by_distance((123.782667, 127, 3.217333))[0], mode=Mode.SUBTRACT)
    add(cut_extrude9_tool3.solids().sort_by_distance((123.782667, 127, 123.782667))[0], mode=Mode.SUBTRACT)
    add(cut_extrude9_tool4.solids().sort_by_distance((3.217333, 127, 123.782667))[0], mode=Mode.SUBTRACT)


solid = part.part
